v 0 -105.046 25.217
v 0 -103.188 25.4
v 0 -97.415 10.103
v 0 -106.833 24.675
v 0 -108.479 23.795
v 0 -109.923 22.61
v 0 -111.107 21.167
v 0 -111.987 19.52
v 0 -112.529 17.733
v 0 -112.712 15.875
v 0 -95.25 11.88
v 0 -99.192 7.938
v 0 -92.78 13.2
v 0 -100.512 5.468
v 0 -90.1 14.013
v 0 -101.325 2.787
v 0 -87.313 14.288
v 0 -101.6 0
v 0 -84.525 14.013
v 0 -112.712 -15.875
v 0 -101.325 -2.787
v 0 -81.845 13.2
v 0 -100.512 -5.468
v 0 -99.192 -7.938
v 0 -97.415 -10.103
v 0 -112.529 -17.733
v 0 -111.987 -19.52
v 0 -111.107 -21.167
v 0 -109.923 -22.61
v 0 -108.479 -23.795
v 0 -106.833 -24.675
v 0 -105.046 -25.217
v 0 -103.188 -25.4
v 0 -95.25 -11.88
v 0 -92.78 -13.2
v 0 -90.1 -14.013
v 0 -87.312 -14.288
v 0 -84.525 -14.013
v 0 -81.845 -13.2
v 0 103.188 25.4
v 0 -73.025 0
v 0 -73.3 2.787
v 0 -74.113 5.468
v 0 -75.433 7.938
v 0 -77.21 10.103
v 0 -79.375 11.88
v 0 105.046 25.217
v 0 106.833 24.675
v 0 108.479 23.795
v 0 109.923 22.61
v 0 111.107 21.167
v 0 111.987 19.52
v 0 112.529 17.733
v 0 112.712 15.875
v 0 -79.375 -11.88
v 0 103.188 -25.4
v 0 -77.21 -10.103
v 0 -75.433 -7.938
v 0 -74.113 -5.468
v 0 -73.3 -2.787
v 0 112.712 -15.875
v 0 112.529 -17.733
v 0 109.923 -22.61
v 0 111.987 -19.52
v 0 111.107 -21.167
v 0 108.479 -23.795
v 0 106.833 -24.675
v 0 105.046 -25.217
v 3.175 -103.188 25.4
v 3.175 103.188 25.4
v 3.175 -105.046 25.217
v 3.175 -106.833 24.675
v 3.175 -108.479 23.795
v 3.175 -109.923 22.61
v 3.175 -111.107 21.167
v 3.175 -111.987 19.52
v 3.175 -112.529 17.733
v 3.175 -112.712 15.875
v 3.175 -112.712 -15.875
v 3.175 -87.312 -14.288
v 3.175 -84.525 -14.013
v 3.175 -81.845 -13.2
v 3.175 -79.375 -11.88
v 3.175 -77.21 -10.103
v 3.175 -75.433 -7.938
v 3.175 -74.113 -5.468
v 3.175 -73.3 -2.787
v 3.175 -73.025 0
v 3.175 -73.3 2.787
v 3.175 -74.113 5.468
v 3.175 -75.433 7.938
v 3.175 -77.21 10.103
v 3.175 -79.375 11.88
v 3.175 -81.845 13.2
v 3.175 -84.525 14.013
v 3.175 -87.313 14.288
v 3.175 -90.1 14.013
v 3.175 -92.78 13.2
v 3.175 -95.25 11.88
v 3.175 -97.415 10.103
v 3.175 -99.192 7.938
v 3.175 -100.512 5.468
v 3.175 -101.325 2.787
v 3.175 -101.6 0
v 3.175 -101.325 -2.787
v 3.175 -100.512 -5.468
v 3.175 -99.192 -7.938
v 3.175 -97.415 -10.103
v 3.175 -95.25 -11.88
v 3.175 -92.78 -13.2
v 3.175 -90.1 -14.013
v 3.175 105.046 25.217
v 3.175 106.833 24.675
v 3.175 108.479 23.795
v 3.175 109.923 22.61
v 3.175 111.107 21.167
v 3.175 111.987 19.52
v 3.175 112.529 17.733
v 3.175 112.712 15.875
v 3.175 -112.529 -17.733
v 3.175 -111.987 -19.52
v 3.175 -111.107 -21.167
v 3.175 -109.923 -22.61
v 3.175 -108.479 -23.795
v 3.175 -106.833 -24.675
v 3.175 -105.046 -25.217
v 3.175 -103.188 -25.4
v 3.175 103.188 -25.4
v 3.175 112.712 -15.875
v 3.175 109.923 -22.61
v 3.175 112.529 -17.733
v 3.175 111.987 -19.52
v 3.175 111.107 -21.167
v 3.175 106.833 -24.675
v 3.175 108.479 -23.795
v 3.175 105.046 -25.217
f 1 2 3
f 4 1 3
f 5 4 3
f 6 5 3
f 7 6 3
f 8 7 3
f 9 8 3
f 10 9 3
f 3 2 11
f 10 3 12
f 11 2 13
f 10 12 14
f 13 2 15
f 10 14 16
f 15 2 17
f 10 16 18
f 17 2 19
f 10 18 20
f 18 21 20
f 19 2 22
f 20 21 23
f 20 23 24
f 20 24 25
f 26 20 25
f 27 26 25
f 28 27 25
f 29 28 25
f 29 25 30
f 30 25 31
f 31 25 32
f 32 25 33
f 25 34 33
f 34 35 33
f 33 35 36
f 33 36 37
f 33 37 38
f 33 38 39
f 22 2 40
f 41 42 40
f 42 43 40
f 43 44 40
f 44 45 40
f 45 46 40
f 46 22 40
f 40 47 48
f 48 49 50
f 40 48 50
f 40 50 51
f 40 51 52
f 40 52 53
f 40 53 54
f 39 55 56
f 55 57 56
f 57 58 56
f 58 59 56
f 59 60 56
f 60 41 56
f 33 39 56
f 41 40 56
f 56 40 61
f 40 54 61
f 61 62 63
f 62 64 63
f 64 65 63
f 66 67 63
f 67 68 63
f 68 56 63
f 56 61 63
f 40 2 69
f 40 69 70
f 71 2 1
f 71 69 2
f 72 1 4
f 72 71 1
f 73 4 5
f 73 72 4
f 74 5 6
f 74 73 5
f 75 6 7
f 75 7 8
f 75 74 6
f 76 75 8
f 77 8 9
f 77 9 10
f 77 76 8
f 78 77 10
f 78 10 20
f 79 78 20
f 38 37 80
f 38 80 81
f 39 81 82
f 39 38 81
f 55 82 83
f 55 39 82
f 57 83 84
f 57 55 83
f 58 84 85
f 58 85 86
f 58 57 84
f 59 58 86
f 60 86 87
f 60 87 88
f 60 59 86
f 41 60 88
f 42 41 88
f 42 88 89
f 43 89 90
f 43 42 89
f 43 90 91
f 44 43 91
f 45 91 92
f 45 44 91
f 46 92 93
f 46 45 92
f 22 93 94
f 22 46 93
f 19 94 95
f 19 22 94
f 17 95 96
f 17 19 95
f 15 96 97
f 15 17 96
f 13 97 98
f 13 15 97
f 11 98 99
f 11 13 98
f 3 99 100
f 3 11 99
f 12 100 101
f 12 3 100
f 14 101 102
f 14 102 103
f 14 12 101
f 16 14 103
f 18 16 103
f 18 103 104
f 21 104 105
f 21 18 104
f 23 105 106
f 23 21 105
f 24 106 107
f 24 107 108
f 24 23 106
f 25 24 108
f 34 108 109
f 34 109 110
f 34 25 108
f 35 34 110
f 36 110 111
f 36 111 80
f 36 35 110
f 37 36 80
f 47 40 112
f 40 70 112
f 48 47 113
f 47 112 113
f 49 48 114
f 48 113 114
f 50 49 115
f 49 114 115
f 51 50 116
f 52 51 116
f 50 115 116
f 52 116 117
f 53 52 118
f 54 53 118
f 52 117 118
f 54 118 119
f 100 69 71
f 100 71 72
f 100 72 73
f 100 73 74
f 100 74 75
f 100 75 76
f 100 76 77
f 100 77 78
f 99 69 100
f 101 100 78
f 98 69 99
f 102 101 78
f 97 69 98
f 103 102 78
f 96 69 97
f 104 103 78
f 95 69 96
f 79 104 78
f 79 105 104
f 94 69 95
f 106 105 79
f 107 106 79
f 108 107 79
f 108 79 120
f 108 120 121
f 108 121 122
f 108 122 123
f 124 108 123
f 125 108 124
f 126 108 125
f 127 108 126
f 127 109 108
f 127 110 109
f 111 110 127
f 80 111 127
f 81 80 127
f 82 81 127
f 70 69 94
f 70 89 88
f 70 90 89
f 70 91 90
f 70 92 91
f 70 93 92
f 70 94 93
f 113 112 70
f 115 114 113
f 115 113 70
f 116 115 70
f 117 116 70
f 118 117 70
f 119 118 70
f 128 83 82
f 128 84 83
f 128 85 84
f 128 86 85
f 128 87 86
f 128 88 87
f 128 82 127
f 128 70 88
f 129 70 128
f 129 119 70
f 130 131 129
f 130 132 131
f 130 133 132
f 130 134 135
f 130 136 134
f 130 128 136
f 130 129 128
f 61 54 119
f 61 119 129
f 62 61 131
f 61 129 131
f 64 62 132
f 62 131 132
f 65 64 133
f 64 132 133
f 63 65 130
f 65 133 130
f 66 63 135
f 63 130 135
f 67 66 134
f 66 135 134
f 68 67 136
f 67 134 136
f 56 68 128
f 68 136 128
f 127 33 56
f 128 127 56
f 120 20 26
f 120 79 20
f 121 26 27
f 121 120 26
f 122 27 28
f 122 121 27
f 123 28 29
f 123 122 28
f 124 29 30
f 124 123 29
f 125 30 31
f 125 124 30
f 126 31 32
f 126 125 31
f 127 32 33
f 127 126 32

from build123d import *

# Parameters (mm, degrees)
SKETCH1_W           = 50.8
SKETCH1_H           = 225.425
SKETCH1_R           = 14.2875
BOSS_EXTRUDE1_DEPTH = 3.175
FILLET1_R           = 9.525


with BuildPart() as part:
    # Sketch1 → Boss-Extrude1 (new body)
    with BuildSketch(Plane(origin=(0, 0, 0), x_dir=(0, 0, -1), z_dir=(1, 0, 0))):
        Rectangle(SKETCH1_W, SKETCH1_H)
        with Locations((0, -87.3125)):
            Circle(SKETCH1_R, mode=Mode.SUBTRACT)
    extrude(amount=BOSS_EXTRUDE1_DEPTH)

    # Fillet1
    fillet1_edges = [part.edges().sort_by_distance(p)[0] for p in [
        (1.5875, 112.7125, 25.4),
        (1.5875, 112.7125, -25.4),
        (1.5875, -112.7125, -25.4),
        (1.5875, -112.7125, 25.4),
    ]]
    fillet(fillet1_edges, radius=FILLET1_R)


solid = part.part
